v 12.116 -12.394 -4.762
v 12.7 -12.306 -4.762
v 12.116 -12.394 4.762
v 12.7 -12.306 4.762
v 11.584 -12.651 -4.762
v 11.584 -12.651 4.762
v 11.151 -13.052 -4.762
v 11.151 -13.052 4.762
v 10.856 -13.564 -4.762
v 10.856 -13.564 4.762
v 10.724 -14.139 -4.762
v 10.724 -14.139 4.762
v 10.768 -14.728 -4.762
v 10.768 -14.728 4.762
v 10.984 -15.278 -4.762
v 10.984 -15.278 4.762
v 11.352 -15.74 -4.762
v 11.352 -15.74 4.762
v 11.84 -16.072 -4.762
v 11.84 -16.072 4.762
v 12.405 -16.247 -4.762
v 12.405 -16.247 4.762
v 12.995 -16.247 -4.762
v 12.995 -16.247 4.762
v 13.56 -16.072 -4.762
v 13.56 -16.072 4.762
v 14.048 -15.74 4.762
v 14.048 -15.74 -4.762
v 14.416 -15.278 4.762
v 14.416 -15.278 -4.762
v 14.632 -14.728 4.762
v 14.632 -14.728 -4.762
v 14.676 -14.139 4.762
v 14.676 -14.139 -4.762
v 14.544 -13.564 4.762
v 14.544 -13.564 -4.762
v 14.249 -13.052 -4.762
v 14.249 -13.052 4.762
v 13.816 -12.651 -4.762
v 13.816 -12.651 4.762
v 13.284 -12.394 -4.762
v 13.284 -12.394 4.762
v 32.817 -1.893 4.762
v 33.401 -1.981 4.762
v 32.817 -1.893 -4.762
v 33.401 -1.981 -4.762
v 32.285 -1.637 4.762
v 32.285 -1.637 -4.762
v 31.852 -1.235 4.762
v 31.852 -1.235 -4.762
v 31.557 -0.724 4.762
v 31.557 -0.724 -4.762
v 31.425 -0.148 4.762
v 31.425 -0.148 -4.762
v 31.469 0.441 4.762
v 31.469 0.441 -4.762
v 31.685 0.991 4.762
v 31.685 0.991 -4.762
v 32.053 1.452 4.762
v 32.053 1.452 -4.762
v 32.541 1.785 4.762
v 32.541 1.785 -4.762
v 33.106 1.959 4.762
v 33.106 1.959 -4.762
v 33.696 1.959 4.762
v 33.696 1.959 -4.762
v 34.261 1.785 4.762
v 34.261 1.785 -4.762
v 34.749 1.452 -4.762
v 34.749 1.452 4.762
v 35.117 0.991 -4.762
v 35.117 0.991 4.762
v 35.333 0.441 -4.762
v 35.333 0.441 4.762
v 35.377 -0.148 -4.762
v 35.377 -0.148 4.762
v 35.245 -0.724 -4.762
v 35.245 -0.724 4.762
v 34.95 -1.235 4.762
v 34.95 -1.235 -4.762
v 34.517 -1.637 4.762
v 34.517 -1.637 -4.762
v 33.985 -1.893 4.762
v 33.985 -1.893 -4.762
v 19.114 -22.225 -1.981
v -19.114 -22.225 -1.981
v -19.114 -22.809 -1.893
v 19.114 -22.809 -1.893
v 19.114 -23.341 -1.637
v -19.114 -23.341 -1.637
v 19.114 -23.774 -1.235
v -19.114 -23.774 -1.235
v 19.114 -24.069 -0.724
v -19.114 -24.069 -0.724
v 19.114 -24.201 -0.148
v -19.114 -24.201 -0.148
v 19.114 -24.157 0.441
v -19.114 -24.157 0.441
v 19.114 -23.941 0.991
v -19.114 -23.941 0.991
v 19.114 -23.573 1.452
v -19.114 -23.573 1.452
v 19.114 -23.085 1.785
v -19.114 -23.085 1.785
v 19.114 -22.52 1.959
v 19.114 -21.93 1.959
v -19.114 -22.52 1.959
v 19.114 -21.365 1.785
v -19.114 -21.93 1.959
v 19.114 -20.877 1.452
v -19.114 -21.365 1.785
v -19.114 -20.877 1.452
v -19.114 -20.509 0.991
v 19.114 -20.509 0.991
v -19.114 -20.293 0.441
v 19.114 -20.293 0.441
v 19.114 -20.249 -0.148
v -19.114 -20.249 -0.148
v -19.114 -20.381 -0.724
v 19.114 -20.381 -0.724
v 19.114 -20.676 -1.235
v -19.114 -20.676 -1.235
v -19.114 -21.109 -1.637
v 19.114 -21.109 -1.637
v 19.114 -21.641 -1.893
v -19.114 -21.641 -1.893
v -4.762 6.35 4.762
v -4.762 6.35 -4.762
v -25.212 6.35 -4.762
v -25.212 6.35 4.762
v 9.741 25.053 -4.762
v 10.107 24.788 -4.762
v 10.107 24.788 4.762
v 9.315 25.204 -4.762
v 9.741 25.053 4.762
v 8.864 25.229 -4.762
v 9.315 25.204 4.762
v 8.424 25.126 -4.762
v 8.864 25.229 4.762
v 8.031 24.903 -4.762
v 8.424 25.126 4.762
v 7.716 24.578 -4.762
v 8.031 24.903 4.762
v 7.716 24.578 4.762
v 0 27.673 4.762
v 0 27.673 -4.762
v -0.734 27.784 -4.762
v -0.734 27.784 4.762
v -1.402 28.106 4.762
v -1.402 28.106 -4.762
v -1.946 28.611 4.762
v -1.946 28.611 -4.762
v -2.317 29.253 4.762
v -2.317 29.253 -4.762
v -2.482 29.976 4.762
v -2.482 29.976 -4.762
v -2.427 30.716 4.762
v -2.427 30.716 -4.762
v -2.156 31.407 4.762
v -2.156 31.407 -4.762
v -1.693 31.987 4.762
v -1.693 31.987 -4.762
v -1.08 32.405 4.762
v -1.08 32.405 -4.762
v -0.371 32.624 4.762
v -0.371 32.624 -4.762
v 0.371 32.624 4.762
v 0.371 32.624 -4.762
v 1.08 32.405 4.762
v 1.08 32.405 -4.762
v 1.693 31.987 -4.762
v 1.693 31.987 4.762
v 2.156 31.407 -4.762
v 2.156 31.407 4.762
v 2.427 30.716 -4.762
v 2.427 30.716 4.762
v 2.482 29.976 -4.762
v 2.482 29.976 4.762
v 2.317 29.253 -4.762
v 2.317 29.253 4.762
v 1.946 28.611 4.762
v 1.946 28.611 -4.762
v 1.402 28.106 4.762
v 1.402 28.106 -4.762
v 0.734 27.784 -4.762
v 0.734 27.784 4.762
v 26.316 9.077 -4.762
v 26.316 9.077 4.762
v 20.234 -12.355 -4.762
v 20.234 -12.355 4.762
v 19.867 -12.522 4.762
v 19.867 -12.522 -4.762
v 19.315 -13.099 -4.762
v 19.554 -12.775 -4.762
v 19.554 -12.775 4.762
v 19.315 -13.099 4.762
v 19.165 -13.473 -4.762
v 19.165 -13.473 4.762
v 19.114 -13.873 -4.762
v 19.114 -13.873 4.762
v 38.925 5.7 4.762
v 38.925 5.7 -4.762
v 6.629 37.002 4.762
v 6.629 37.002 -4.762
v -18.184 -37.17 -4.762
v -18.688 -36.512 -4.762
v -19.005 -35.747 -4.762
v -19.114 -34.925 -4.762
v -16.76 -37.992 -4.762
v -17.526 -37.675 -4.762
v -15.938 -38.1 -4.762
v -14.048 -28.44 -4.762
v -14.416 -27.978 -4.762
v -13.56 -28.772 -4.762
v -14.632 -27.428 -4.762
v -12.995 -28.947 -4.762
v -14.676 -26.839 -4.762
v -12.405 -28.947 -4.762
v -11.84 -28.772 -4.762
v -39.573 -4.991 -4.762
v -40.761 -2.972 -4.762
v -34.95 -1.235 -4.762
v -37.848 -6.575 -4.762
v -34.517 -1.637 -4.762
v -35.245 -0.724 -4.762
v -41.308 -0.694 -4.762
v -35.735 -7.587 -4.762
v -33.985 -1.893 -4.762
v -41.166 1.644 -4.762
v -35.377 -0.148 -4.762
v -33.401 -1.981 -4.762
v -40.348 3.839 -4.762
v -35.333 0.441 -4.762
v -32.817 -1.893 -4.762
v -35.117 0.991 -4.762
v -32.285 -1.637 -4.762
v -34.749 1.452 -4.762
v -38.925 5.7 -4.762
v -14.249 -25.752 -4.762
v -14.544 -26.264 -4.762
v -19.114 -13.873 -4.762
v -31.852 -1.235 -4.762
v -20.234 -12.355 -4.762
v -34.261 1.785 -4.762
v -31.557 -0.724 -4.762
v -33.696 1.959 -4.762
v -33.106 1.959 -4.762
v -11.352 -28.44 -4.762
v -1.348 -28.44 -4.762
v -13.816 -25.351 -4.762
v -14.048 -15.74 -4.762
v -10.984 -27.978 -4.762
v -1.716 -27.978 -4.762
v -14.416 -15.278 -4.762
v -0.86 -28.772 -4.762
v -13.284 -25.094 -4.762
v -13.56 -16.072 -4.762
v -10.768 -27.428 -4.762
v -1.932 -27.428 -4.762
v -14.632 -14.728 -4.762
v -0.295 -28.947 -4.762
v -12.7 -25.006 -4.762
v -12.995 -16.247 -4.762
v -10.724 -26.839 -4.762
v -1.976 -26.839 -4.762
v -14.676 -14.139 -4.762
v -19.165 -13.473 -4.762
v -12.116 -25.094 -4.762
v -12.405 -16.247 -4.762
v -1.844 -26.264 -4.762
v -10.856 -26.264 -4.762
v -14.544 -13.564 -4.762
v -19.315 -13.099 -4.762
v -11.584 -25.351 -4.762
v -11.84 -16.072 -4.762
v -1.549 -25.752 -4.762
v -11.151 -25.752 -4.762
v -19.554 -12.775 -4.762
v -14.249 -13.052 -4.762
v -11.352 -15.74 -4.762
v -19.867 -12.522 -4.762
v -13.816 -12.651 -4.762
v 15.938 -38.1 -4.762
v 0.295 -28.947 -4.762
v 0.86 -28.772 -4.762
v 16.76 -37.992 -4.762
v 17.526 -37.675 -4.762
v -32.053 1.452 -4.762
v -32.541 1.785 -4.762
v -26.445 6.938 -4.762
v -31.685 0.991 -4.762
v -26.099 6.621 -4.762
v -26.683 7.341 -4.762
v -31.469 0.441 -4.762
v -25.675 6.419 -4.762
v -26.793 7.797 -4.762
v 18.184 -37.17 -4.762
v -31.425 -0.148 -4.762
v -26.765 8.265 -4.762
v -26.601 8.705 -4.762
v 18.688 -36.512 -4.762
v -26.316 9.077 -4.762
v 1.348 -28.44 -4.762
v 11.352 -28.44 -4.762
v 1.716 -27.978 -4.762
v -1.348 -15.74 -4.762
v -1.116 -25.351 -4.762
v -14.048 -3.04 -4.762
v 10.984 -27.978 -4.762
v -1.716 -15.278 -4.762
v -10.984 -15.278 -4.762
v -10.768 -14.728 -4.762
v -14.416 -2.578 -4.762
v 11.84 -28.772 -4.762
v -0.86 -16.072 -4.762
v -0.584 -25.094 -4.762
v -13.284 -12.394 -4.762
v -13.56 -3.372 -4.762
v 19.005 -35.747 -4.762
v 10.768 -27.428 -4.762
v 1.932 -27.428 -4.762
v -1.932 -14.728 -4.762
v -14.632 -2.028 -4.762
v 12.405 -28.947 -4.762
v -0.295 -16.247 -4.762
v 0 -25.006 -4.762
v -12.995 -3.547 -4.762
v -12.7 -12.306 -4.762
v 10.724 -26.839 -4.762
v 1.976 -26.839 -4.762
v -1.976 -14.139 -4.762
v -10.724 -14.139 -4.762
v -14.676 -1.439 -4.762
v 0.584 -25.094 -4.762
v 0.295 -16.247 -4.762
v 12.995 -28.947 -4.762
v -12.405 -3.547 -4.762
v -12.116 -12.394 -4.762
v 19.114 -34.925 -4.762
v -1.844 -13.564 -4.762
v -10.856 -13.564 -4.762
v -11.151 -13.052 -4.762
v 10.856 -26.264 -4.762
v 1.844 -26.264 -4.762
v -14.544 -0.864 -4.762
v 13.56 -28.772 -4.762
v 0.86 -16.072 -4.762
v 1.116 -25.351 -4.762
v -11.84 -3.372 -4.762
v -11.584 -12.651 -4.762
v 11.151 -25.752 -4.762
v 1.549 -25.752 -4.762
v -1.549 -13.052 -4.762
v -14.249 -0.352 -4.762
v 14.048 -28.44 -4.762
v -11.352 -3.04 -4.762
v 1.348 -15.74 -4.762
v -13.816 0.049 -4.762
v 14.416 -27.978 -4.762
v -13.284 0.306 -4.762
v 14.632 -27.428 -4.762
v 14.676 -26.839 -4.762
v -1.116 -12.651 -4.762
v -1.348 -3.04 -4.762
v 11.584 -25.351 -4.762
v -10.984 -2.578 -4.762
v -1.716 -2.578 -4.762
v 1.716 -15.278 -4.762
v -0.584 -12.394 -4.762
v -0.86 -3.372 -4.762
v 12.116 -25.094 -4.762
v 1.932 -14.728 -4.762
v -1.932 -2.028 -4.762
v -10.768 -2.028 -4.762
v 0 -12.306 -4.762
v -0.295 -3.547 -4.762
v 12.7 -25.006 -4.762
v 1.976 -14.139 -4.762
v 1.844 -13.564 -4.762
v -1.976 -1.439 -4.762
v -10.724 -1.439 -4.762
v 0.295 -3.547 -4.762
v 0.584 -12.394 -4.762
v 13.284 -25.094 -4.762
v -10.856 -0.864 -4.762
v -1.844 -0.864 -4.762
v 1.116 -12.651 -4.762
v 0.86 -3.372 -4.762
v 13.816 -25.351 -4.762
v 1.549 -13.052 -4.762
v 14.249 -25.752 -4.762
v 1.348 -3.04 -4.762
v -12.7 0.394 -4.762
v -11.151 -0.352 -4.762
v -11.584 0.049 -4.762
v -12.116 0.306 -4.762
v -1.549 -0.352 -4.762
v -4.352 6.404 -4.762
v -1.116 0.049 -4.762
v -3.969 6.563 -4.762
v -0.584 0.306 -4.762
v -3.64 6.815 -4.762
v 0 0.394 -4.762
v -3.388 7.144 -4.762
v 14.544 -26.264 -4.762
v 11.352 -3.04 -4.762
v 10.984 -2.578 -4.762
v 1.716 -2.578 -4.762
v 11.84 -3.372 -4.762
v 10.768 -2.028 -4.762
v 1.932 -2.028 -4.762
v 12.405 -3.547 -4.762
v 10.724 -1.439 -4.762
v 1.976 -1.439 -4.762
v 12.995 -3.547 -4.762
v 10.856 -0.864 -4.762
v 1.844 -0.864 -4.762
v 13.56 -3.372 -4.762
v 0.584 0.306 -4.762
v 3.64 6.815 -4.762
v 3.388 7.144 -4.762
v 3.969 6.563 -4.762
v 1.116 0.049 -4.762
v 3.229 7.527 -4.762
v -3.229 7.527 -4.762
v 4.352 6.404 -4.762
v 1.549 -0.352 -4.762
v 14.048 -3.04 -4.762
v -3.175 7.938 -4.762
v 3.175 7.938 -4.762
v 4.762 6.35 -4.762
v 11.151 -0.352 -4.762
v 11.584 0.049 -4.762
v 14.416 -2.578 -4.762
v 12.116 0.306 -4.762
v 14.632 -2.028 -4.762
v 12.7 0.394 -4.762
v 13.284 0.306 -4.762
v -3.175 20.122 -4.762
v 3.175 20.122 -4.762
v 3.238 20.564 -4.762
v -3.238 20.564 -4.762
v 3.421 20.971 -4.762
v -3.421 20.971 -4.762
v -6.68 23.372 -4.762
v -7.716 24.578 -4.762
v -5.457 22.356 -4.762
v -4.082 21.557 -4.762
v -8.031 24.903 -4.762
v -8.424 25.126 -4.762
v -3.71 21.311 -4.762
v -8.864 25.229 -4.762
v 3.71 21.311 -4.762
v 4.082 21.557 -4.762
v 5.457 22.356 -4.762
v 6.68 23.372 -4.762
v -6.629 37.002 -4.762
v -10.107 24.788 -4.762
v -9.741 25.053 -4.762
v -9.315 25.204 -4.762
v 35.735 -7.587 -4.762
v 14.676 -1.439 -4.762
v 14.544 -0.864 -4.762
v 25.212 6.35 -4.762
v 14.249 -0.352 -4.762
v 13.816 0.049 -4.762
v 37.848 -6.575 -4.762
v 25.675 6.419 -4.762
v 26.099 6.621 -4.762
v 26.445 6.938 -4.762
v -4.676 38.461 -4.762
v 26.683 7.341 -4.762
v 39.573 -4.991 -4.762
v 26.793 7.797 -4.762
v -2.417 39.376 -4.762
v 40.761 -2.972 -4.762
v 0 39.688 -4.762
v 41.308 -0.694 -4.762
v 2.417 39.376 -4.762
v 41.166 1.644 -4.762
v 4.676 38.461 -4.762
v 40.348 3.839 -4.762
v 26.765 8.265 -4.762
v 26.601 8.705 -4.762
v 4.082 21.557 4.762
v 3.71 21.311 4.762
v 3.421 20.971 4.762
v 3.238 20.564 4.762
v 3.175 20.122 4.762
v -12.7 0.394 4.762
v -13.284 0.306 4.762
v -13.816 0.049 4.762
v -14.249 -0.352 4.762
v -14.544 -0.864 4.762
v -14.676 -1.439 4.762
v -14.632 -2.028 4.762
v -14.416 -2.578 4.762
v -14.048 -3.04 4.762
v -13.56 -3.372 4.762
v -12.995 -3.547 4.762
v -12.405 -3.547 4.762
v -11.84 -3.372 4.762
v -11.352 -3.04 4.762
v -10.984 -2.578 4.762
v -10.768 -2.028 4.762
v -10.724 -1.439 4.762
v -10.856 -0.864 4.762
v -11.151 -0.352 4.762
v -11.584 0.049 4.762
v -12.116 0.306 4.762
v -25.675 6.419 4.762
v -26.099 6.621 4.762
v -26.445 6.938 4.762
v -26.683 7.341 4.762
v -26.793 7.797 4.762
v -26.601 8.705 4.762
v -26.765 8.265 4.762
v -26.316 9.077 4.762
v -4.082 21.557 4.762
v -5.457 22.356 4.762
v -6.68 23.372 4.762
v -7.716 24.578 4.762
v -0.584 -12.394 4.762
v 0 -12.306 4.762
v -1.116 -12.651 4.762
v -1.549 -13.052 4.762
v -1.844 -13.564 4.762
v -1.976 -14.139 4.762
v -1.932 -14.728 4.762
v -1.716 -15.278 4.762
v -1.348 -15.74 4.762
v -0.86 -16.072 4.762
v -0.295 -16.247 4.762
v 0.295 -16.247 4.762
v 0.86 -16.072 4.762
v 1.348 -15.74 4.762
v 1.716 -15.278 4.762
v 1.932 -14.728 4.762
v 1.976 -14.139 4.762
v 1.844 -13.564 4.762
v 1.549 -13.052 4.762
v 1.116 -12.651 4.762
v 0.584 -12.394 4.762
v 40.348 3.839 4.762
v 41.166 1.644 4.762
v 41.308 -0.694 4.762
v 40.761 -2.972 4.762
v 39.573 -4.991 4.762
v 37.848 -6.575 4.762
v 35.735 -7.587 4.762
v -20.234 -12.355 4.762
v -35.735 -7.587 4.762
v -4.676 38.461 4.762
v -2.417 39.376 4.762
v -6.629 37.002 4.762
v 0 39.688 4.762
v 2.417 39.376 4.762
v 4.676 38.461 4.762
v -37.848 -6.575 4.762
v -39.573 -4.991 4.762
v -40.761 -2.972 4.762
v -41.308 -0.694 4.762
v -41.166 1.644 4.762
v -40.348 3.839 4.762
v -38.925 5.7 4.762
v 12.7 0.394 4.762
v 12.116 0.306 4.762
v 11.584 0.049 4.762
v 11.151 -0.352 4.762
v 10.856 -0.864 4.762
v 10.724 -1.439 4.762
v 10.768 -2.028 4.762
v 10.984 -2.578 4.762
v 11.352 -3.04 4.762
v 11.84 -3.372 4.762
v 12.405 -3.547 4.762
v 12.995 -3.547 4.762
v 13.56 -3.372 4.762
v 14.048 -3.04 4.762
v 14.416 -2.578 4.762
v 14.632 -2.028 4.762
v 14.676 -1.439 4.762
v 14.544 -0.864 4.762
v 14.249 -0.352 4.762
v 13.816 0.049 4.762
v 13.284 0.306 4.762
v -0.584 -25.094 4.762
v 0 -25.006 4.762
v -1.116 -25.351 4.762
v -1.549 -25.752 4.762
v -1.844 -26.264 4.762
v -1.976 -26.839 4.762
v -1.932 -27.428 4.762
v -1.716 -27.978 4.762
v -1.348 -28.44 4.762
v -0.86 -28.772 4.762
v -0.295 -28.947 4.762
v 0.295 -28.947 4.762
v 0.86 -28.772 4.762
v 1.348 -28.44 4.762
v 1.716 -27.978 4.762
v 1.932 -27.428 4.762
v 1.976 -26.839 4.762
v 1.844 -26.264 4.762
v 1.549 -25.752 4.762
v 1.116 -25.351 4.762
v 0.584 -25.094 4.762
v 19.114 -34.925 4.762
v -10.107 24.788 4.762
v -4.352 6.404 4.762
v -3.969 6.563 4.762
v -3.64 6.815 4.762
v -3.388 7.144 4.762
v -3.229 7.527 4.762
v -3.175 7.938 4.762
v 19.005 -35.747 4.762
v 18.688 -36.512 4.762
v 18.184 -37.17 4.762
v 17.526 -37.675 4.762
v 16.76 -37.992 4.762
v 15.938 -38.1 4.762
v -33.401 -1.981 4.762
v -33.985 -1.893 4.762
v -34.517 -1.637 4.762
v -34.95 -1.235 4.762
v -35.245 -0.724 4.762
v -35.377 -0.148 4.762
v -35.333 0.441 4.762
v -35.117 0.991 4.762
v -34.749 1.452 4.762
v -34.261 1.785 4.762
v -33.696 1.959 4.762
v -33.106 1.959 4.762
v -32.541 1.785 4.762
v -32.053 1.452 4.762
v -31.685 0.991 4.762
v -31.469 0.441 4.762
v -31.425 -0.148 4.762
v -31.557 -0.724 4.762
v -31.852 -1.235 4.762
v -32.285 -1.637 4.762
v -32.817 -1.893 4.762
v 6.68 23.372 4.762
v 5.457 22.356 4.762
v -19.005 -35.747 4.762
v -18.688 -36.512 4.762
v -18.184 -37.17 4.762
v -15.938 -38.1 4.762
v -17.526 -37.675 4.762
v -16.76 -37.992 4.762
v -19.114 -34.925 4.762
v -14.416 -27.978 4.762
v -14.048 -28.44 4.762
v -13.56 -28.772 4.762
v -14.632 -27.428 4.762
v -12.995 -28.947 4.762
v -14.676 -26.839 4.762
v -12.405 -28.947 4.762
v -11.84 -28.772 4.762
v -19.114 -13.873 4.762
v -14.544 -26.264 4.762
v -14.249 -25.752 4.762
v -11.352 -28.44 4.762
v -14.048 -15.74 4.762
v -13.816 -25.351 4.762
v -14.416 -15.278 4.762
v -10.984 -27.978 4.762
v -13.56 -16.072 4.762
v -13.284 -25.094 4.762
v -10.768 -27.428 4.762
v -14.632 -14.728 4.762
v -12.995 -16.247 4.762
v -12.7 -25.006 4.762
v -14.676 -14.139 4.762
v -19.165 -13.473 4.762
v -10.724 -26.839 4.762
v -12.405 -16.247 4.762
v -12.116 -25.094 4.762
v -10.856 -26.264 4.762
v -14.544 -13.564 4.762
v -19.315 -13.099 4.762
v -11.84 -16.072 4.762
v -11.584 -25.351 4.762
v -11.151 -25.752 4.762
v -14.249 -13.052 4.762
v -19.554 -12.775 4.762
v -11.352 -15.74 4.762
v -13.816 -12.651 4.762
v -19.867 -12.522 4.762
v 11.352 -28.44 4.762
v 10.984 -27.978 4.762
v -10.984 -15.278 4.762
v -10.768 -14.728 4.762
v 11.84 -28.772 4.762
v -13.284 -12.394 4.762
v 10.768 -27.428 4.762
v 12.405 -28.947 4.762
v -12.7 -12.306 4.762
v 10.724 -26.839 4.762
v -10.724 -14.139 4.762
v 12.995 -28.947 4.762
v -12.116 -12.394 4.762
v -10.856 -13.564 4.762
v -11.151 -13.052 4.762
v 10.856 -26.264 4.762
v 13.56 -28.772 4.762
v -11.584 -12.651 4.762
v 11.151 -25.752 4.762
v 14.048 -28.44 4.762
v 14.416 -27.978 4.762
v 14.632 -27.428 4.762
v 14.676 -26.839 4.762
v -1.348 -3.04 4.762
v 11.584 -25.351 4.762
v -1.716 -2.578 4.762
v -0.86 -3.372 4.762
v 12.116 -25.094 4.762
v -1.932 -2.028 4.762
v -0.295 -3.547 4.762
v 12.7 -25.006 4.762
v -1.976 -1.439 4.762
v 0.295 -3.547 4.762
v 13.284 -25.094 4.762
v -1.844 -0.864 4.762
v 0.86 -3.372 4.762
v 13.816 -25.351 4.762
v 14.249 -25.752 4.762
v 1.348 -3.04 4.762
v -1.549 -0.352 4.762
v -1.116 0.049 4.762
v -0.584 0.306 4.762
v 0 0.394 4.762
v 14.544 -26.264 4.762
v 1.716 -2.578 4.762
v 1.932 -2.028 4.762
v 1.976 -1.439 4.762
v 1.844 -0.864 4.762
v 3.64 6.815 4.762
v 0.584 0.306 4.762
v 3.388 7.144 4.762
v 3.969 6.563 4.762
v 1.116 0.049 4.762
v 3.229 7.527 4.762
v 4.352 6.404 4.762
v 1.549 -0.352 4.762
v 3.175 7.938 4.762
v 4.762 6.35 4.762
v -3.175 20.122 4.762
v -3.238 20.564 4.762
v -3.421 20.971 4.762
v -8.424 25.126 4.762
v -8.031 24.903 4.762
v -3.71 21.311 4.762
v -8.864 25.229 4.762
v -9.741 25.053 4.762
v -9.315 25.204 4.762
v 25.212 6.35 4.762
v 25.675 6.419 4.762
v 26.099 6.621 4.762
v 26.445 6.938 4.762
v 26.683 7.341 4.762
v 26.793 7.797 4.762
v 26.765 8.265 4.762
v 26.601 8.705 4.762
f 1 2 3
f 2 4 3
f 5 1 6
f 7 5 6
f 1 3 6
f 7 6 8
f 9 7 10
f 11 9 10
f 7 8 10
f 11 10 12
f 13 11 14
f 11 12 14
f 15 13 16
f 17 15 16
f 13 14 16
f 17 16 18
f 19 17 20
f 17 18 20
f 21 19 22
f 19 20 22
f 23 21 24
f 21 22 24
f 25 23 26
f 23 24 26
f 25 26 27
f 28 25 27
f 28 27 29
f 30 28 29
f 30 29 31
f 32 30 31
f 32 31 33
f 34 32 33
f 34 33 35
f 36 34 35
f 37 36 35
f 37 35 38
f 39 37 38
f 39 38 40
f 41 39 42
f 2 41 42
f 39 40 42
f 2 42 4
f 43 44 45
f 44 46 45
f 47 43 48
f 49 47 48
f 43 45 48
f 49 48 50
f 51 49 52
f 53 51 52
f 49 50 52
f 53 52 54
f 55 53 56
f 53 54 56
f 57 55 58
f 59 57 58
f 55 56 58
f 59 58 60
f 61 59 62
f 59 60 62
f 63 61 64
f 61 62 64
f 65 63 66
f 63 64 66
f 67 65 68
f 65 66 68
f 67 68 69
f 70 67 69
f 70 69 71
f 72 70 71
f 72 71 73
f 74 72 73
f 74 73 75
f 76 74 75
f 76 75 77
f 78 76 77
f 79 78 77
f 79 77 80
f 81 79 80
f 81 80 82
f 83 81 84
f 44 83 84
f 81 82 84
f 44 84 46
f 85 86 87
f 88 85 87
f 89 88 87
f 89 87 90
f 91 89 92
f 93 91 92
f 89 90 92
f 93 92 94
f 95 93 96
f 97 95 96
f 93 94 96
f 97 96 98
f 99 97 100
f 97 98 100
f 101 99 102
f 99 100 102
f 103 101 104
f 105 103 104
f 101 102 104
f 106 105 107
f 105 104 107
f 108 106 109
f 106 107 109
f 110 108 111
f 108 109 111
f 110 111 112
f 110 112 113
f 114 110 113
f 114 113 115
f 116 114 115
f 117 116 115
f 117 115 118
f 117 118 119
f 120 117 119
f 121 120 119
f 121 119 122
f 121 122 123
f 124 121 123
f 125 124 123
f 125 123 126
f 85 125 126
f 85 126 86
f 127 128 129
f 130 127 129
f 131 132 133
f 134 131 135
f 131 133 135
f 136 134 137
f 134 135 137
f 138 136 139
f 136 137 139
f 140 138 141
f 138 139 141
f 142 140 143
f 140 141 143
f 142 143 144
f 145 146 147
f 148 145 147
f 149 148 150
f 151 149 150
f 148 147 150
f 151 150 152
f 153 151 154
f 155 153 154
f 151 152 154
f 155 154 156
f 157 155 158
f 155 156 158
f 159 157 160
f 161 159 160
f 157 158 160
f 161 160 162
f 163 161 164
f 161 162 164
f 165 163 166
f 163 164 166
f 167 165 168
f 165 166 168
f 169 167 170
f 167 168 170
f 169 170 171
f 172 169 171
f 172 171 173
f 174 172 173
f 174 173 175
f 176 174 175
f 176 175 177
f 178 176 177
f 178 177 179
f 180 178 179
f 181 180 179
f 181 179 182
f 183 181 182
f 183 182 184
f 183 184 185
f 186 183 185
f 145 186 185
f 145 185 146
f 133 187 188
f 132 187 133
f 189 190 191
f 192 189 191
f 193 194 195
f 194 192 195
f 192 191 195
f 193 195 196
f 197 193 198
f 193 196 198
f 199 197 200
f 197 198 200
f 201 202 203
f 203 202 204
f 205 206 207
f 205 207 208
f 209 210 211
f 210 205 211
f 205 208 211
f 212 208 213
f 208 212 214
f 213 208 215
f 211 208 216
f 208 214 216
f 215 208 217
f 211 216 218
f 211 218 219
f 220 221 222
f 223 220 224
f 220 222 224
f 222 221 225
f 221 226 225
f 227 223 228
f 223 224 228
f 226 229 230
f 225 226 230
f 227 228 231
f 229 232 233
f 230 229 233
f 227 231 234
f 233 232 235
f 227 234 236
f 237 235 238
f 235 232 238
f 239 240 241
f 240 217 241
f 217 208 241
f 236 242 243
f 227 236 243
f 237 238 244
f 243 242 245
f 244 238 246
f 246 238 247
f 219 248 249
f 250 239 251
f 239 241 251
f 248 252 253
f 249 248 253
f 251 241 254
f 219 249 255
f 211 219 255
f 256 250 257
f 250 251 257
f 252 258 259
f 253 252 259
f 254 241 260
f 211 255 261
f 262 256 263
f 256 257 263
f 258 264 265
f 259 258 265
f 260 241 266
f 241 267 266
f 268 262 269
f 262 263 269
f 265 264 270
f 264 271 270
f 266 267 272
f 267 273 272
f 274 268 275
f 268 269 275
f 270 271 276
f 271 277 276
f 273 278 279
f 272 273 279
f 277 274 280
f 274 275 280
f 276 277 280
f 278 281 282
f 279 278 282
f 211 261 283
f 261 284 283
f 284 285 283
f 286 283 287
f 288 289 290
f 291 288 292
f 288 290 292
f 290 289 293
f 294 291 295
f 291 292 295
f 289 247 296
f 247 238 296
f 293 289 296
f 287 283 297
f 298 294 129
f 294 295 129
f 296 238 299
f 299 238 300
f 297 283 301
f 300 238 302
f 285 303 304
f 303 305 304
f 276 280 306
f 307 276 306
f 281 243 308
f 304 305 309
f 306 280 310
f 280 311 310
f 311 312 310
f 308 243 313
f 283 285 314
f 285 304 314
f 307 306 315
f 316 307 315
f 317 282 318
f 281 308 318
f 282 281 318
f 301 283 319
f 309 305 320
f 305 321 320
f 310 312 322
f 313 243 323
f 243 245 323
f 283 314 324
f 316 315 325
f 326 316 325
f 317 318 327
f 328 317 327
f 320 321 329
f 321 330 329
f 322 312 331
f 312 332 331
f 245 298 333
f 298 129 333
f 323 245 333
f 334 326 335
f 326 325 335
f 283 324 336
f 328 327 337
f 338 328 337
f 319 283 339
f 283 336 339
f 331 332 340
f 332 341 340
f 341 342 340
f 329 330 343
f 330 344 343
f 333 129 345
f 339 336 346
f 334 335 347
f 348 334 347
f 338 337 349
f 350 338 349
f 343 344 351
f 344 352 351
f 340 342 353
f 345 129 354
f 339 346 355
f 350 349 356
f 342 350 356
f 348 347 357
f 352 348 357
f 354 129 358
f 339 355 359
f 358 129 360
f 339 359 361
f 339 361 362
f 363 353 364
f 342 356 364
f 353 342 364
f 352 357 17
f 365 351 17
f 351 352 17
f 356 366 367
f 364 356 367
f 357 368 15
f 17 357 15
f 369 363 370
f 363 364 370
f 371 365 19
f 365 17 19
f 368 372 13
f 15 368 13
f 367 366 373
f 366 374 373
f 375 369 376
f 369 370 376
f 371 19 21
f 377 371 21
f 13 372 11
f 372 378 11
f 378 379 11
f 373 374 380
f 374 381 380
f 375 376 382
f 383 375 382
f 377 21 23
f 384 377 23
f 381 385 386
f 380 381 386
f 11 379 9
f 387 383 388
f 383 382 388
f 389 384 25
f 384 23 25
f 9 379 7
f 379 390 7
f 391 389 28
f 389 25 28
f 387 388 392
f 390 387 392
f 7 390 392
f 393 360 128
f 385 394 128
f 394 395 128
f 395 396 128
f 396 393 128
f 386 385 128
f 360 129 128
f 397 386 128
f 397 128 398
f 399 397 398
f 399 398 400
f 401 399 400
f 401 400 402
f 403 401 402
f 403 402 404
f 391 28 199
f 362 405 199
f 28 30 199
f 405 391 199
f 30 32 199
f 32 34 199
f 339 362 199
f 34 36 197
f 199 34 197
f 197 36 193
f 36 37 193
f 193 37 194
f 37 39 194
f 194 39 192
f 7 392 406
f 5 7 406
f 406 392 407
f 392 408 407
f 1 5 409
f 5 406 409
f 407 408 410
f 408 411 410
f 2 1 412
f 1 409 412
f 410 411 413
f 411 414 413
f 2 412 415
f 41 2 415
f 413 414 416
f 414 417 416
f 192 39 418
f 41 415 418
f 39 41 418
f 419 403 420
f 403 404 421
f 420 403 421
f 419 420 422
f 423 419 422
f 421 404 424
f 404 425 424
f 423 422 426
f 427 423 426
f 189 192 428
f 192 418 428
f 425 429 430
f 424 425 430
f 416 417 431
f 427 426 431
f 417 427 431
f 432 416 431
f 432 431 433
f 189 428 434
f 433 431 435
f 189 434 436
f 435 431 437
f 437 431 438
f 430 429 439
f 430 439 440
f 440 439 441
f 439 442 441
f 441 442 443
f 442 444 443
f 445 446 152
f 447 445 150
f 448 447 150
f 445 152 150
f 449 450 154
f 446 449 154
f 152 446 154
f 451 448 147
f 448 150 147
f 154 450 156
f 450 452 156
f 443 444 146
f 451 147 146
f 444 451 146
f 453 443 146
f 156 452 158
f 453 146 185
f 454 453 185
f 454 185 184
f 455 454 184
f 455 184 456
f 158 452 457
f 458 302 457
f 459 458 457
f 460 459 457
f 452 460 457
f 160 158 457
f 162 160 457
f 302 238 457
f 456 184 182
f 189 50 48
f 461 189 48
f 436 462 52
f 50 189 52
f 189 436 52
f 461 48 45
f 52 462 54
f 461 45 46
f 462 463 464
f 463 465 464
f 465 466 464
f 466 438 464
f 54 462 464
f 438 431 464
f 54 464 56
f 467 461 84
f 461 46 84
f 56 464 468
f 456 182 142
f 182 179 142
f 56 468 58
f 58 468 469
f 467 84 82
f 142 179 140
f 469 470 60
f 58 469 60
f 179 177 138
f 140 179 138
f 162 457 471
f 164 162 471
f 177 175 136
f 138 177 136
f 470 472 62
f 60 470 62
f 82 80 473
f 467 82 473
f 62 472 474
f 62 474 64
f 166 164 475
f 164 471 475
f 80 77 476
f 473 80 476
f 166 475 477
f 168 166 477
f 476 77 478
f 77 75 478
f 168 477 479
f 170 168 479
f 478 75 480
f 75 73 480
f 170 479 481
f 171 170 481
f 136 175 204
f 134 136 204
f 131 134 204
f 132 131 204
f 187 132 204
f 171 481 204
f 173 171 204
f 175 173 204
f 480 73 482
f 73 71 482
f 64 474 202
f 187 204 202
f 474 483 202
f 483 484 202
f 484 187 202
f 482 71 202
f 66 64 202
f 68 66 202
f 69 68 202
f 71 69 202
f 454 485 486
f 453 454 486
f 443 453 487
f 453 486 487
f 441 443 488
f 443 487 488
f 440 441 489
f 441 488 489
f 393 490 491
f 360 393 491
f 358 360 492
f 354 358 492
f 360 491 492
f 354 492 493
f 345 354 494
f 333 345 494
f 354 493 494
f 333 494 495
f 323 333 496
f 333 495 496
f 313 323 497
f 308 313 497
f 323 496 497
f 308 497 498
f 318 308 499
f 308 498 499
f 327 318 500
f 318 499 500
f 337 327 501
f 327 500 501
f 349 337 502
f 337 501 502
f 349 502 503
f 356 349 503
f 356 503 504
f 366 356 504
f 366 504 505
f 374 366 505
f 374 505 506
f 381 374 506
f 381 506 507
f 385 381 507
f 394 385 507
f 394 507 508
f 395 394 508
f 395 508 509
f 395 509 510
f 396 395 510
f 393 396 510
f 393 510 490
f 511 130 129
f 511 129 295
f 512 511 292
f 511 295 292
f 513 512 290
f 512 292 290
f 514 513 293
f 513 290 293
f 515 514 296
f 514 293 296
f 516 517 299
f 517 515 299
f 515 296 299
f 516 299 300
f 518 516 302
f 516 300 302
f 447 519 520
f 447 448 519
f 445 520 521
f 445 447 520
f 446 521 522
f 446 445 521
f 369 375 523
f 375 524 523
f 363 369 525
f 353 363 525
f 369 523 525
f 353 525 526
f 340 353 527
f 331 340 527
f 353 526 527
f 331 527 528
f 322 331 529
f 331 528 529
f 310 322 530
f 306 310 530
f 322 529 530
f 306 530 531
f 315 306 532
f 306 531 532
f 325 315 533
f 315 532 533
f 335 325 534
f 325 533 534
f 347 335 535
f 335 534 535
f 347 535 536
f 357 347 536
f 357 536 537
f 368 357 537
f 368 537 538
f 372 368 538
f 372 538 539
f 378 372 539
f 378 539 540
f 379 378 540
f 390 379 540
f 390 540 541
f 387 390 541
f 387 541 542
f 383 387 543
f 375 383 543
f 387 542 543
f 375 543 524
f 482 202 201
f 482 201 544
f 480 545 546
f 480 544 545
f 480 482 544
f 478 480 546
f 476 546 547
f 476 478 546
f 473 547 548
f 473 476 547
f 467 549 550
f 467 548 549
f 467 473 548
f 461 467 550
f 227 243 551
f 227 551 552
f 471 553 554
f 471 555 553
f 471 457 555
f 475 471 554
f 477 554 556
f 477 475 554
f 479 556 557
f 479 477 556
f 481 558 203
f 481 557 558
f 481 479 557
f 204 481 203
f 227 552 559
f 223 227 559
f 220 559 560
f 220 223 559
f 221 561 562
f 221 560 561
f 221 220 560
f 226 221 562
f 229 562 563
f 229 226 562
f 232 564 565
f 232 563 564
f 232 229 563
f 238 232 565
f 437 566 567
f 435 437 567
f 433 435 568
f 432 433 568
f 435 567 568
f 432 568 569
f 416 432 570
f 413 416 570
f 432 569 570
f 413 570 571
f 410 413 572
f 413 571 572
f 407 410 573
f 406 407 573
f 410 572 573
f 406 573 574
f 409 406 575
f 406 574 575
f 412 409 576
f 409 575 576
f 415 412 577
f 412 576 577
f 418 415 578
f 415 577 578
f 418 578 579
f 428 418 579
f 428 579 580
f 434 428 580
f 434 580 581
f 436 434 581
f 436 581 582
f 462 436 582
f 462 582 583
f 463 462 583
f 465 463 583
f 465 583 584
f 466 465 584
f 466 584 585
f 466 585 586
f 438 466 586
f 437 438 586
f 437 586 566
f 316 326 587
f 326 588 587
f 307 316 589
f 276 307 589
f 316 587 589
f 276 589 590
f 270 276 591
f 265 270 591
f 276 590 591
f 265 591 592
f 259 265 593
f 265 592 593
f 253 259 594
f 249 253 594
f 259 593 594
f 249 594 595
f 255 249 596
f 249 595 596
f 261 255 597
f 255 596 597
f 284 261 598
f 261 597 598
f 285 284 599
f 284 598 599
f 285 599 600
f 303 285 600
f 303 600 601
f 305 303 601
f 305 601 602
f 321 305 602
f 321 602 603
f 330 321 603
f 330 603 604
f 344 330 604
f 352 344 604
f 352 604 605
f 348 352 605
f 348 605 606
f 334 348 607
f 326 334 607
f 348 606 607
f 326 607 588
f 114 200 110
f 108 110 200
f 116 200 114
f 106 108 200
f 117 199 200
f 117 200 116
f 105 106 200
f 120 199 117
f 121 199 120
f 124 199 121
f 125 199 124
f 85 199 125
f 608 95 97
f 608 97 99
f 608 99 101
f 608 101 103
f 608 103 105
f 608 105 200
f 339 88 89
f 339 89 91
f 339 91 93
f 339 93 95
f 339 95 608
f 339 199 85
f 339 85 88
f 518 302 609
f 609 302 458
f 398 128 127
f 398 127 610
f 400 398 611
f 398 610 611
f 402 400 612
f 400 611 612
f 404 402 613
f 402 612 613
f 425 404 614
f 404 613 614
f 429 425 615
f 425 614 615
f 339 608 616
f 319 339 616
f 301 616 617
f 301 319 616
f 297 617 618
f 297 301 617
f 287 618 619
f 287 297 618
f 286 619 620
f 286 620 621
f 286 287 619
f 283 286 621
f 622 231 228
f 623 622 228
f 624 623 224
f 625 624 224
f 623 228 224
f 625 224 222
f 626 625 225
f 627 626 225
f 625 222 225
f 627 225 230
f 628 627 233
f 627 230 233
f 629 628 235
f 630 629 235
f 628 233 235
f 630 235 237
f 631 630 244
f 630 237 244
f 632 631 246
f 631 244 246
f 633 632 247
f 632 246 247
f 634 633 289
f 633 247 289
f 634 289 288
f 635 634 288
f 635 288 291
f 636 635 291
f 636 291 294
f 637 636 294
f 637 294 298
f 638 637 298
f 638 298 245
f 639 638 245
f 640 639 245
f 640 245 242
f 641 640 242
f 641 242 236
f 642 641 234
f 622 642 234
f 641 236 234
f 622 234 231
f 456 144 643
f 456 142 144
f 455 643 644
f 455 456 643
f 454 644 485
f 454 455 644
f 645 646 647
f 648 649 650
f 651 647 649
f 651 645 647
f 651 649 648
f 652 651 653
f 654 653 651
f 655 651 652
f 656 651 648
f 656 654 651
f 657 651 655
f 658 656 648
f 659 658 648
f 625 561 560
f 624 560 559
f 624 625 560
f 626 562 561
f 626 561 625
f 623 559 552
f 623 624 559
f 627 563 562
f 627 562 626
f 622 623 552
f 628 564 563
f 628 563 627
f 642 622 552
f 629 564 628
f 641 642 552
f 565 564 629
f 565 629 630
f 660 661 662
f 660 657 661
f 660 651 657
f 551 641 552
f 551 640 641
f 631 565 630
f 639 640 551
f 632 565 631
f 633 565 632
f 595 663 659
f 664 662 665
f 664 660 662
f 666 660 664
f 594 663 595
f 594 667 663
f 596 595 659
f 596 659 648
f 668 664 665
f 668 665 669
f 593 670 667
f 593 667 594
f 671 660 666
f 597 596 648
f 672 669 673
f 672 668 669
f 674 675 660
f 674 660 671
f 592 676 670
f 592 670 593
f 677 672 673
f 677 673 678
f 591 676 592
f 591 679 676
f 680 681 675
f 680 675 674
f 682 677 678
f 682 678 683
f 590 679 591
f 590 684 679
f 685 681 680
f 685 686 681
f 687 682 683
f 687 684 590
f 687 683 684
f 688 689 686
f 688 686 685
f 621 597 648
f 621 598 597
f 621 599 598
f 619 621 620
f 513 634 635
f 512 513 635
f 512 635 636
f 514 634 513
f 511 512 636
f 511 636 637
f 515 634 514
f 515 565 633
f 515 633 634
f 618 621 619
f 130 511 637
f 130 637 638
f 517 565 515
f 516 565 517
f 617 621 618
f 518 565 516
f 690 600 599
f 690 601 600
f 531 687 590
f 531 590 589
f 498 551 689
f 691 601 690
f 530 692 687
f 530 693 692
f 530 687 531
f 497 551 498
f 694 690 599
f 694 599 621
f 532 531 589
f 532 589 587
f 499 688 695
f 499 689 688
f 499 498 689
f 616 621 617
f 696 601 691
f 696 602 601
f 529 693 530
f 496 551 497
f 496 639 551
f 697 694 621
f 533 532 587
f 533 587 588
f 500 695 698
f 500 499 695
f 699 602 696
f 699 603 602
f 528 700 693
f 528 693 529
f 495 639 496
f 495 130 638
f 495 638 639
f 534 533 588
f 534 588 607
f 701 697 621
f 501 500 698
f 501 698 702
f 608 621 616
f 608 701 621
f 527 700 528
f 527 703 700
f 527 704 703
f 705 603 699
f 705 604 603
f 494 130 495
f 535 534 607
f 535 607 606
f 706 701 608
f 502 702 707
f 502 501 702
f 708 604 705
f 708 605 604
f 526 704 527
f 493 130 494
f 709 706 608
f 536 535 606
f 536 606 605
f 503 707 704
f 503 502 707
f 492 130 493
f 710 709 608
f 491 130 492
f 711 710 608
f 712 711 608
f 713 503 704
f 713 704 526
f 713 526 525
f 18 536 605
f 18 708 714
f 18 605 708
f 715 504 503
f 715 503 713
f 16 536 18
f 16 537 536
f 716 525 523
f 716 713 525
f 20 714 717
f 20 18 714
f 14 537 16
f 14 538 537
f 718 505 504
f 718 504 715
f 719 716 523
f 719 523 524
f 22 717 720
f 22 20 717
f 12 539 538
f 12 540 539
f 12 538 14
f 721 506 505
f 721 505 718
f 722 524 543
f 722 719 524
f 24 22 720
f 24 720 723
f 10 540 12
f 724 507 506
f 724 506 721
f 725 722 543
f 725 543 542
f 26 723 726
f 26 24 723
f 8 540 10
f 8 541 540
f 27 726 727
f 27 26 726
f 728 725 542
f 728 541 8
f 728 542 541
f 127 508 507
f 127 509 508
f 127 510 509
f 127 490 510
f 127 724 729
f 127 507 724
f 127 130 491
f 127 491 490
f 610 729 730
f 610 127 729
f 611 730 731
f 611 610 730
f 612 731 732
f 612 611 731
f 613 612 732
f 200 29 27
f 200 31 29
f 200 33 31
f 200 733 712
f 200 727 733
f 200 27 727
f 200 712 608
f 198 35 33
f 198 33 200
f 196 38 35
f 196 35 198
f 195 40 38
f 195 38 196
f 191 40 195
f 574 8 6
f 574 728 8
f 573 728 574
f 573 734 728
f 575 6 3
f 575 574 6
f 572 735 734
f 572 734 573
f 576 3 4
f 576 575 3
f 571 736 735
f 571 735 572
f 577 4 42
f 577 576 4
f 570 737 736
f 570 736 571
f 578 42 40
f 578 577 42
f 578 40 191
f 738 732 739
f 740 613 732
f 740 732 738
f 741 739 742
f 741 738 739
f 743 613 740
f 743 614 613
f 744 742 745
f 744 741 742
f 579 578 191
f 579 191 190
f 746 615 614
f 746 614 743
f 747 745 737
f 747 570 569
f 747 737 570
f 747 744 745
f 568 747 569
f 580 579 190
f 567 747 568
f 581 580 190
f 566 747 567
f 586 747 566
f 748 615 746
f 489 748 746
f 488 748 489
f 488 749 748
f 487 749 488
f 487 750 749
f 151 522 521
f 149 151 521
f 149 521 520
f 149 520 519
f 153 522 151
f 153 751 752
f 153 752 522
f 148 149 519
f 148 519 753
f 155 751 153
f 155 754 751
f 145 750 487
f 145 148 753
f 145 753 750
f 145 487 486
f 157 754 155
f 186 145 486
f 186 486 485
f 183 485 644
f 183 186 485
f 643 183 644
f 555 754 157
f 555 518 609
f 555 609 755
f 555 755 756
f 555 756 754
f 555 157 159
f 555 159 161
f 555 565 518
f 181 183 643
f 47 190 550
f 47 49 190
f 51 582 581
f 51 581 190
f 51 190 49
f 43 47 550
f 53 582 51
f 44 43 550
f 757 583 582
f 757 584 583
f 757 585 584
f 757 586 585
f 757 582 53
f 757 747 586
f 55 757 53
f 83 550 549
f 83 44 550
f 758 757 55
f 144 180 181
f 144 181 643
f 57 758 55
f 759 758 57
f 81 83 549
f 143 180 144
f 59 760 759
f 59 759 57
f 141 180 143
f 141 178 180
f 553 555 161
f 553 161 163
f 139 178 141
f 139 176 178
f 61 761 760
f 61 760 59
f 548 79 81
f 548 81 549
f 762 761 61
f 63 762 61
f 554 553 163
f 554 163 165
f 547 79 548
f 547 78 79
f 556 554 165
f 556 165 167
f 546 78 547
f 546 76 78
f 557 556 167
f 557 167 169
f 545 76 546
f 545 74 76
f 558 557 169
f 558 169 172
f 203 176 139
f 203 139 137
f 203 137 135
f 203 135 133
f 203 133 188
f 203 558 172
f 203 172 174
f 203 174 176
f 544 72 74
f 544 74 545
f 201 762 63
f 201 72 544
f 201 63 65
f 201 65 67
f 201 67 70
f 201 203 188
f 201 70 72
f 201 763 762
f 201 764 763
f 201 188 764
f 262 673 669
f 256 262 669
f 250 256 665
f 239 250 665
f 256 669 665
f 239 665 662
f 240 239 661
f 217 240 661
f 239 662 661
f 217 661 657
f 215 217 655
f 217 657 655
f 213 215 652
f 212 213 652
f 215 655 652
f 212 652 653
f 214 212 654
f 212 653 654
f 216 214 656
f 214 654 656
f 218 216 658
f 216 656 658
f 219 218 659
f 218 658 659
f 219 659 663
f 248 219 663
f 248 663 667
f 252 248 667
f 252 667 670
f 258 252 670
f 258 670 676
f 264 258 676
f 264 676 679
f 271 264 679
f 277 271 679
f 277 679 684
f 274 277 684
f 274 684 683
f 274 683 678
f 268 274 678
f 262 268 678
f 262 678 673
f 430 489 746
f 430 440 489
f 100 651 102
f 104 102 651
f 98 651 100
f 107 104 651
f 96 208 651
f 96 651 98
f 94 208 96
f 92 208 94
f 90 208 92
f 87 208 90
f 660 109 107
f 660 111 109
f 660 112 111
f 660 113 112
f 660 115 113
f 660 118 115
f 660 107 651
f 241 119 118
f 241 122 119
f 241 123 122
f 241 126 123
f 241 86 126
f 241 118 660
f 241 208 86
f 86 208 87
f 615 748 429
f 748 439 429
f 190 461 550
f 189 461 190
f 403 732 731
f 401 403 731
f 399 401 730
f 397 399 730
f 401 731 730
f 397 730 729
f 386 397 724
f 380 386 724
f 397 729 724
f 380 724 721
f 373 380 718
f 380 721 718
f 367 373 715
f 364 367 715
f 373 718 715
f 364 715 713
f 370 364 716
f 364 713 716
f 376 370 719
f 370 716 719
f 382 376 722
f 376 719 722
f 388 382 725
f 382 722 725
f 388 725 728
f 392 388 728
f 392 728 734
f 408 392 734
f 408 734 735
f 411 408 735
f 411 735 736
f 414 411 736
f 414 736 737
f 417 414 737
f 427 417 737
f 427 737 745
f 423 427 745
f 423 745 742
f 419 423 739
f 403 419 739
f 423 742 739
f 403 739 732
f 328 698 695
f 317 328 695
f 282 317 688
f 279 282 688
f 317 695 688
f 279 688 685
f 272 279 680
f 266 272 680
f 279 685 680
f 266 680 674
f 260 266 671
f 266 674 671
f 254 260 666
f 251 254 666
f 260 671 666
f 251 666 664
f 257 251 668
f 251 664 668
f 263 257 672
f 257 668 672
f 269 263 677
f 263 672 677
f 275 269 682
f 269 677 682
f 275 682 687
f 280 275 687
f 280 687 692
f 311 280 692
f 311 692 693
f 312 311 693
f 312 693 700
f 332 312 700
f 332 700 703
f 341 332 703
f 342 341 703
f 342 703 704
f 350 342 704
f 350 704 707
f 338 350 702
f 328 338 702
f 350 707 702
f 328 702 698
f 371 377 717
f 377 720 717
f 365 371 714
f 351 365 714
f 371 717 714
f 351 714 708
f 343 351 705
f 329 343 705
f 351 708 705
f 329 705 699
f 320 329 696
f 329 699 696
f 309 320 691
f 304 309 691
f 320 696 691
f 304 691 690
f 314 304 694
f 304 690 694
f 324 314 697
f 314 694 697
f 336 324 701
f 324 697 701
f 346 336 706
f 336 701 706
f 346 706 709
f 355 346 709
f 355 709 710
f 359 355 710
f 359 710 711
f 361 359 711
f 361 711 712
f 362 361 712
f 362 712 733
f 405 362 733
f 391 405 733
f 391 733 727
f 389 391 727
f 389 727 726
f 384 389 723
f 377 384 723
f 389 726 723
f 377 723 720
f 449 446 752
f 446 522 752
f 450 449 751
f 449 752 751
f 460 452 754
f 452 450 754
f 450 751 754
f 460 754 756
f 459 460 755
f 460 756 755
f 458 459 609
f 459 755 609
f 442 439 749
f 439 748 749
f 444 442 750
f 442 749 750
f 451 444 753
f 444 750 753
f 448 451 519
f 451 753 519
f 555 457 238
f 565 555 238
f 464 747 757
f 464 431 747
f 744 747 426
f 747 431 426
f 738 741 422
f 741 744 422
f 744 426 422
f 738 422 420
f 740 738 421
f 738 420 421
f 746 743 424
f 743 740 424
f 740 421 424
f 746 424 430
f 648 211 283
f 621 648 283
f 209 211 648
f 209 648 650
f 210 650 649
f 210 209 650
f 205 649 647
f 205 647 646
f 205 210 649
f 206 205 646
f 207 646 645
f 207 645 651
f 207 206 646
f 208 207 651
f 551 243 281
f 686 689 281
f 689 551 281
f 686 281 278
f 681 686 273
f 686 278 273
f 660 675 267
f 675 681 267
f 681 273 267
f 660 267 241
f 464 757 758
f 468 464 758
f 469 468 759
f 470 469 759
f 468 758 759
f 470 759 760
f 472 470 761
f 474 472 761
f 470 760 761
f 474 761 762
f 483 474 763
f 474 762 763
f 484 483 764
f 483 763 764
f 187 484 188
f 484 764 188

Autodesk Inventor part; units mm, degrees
ref_plane "YZ Plane" through (0, 0, 0) normal (1, 0, 0) x (0, 1, 0)
ref_plane "XZ Plane" through (0, 0, 0) normal (0, 1, 0) x (-1, 0, 0)
ref_plane "XY Plane" through (0, 0, 0) normal (0, 0, 1) x (1, 0, 0)
sketch "Sketch1" plane through (0, 0, 0) normal (0, 0, 1) x (1, 0, 0)
  line L0 (33.401, 0) -> (-33.401, 0) construction
  arc A0 (38.9253, 5.6997) -> (35.7349, -7.5866) centre (33.401, 0) ccw construction
  arc A1 (-35.7349, -7.5866) -> (-38.9253, 5.6997) centre (-33.401, 0) ccw construction
  line L1 (19.1135, -12.7) -> (19.1135, -38.1)
  line L2 (-19.1135, -38.1) -> (-19.1135, -12.7)
  line L3 (-19.1135, -12.7) -> (-35.7349, -7.5866)
  arc A2 (35.7349, -7.5866) -> (38.9253, 5.6997) centre (33.401, 0) ccw
  arc A3 (-38.9253, 5.6997) -> (-35.7349, -7.5866) centre (-33.401, 0) ccw
  line L4 (0, 55.245) -> (0, -53.6575) construction
  line L5 (-19.1135, -38.1) -> (19.1135, -38.1)
  line L6 (35.7349, -7.5866) -> (19.1135, -12.7)
  line L7 (38.9253, 5.6997) -> (6.6291, 37.0021)
  circle A4 centre (0, 30.1625) radius 9.525
  line L8 (-6.6291, 37.0021) -> (-38.9253, 5.6997)
  line L9 (29.1304, 6.35) -> (8.6581, 26.1923)
  line L10 (3.175, 21.1822) -> (3.175, 6.35)
  line L11 (3.175, 6.35) -> (29.1304, 6.35)
  line L12 (-29.1304, 6.35) -> (-8.6581, 26.1923)
  line L13 (-3.175, 21.1822) -> (-3.175, 6.35)
  line L14 (-3.175, 6.35) -> (-29.1304, 6.35)
  point P0 (0, 0)
  point P1 (0, 0)
  point P2 (-8.6581, 26.1923)
  point P3 (-3.175, 21.1822)
  dimension "d24" = 50.927
  dimension "d25" = 7.9375
  dimension "d26" = 25.4
  dimension "d30" = 6.35
  dimension "d73" = 12.7
  dimension "d112" = 9.525
  dimension "d113" = 30.1625
  dimension "d115" = 6.35
  dimension "d116" = 6.35
  dimension "d117" = 6.35
extrude "Extrusion2" add sketch "Sketch1" along normal mid plane 9.525 contours L1 L5 L2 L3 A3 L8 A4 L12 L14 L13 L10 L11 L9 L7 A2 L6 | A4
sketch "Sketch2" plane through (0, 0, 4.7625) normal (0, 0, 1) x (1, 0, 0)
  arc A0 (-38.9253, 5.6997) -> (-35.7349, -7.5866) centre (-33.401, 0) ccw construction
  line L0 (-33.401, 0) -> (33.401, 0) construction
  point P0 (0, 0)
  point P1 (0, 0)
hole "Hole1" at (33.401, 0, 4.7625) at (-33.401, 0, 4.7625) direction (0, 0, -1) diameter 3.9624 end through all thread size "10-32 UNF" class "2B" standard "ANSI Unified Screw Threads"
sketch "Sketch3" plane through (0, 0, -4.7625) normal (0, 0, -1) x (-1, 0, 0)
  line L0 (-57.8739, 0) -> (57.8739, 0) construction
  line L1 (0, -53.6575) -> (0, 55.245) construction
  line L2 (12.7, -1.5875) -> (-12.7, -1.5875) construction
  line L3 (12.7, -14.2875) -> (-12.7, -14.2875) construction
  line L4 (12.7, -26.9875) -> (-12.7, -26.9875) construction
  point P0 (0, 0)
  point P1 (0, -1.5875)
  point P2 (0, -14.2875)
  point P3 (0, -26.9875)
  dimension "d43" = 25.4
  dimension "d45" = 1.5875
  dimension "d107" = 12.7
hole "Hole2" at (12.7, -1.5875, -4.7625) at (-12.7, -1.5875, -4.7625) at (0, -1.5875, -4.7625) at (12.7, -14.2875, -4.7625) at (0, -14.2875, -4.7625) at (-12.7, -14.2875, -4.7625) at (12.7, -26.9875, -4.7625) at (0, -26.9875, -4.7625) at (-12.7, -26.9875, -4.7625) direction (0, 0, 1) diameter 3.9624 end through all thread size "10-32 UNF" class "2B" standard "ANSI Unified Screw Threads"
sketch "Sketch6" plane through (19.1135, -38.1, 4.7625) normal (1, 0, 0) x (0, 0, -1)
  line L0 (9.525, 25.4) -> (0, 25.4) construction
  line L1 (0, 0) -> (0, 25.4) construction
  line L2 (9.525, 25.4) -> (9.525, 0) construction
  line L3 (9.525, 0) -> (0, 0) projected
  point P0 (4.7625, 38.1)
  point P1 (4.7625, 15.875)
  dimension "d74" = 22.225
hole "Hole3" at (19.1135, -22.225, 0) direction (-1, 0, 0) diameter 3.9624 end through all thread size "10-32 UNF" class "2B" standard "ANSI Unified Screw Threads"
sketch "Sketch7" plane through (0, 0, 4.7625) normal (0, 0, 1) x (1, 0, 0)
  arc A0 (6.6291, 37.0021) -> (-6.6291, 37.0021) centre (0, 30.1625) ccw construction
  point P0 (0, 0)
hole "Hole4" at (0, 30.1625, 4.7625) direction (0, 0, -1) diameter 4.9784 end through all thread size "1/4-20 UNC" class "2B" standard "ANSI Unified Screw Threads"
fillet "Fillet5" radius 3.175 2 edges at (-19.1135, -38.1, 0) (19.1135, -38.1, 0)
fillet "Fillet7" radius 1.5875 10 edges at (-19.1135, -12.7, 0) (19.1135, -12.7, 0) (29.1304, 6.35, 0) (3.175, 6.35, 0) (3.175, 21.1822, 0) (8.6581, 26.1923, 0) (-3.175, 21.1822, 0) (-8.6581, 26.1923, 0) (-3.175, 6.35, 0) (-29.1304, 6.35, 0)
equation "\"BendRadius\" = Thickness"
equation "\"BendReliefWidth\" = Thickness"
equation "\"BendReliefDepth\" = 0.5 * Thickness"
equation "\"CornerReliefSize\" = 4 * Thickness"
equation "\"MinimumRemnant\" = 2 * Thickness"
equation "\"TransitionRadius\" = BendRadius"
equation "\"JacobiRadiusSize\" = BendRadius"
equation "\"GapSize\" = Thickness"
equation "\"Thickness\" = 6.35"
properties part number "PLATE,TOP,ELEVATOR,STAGE1" material "Aluminum 7075"
